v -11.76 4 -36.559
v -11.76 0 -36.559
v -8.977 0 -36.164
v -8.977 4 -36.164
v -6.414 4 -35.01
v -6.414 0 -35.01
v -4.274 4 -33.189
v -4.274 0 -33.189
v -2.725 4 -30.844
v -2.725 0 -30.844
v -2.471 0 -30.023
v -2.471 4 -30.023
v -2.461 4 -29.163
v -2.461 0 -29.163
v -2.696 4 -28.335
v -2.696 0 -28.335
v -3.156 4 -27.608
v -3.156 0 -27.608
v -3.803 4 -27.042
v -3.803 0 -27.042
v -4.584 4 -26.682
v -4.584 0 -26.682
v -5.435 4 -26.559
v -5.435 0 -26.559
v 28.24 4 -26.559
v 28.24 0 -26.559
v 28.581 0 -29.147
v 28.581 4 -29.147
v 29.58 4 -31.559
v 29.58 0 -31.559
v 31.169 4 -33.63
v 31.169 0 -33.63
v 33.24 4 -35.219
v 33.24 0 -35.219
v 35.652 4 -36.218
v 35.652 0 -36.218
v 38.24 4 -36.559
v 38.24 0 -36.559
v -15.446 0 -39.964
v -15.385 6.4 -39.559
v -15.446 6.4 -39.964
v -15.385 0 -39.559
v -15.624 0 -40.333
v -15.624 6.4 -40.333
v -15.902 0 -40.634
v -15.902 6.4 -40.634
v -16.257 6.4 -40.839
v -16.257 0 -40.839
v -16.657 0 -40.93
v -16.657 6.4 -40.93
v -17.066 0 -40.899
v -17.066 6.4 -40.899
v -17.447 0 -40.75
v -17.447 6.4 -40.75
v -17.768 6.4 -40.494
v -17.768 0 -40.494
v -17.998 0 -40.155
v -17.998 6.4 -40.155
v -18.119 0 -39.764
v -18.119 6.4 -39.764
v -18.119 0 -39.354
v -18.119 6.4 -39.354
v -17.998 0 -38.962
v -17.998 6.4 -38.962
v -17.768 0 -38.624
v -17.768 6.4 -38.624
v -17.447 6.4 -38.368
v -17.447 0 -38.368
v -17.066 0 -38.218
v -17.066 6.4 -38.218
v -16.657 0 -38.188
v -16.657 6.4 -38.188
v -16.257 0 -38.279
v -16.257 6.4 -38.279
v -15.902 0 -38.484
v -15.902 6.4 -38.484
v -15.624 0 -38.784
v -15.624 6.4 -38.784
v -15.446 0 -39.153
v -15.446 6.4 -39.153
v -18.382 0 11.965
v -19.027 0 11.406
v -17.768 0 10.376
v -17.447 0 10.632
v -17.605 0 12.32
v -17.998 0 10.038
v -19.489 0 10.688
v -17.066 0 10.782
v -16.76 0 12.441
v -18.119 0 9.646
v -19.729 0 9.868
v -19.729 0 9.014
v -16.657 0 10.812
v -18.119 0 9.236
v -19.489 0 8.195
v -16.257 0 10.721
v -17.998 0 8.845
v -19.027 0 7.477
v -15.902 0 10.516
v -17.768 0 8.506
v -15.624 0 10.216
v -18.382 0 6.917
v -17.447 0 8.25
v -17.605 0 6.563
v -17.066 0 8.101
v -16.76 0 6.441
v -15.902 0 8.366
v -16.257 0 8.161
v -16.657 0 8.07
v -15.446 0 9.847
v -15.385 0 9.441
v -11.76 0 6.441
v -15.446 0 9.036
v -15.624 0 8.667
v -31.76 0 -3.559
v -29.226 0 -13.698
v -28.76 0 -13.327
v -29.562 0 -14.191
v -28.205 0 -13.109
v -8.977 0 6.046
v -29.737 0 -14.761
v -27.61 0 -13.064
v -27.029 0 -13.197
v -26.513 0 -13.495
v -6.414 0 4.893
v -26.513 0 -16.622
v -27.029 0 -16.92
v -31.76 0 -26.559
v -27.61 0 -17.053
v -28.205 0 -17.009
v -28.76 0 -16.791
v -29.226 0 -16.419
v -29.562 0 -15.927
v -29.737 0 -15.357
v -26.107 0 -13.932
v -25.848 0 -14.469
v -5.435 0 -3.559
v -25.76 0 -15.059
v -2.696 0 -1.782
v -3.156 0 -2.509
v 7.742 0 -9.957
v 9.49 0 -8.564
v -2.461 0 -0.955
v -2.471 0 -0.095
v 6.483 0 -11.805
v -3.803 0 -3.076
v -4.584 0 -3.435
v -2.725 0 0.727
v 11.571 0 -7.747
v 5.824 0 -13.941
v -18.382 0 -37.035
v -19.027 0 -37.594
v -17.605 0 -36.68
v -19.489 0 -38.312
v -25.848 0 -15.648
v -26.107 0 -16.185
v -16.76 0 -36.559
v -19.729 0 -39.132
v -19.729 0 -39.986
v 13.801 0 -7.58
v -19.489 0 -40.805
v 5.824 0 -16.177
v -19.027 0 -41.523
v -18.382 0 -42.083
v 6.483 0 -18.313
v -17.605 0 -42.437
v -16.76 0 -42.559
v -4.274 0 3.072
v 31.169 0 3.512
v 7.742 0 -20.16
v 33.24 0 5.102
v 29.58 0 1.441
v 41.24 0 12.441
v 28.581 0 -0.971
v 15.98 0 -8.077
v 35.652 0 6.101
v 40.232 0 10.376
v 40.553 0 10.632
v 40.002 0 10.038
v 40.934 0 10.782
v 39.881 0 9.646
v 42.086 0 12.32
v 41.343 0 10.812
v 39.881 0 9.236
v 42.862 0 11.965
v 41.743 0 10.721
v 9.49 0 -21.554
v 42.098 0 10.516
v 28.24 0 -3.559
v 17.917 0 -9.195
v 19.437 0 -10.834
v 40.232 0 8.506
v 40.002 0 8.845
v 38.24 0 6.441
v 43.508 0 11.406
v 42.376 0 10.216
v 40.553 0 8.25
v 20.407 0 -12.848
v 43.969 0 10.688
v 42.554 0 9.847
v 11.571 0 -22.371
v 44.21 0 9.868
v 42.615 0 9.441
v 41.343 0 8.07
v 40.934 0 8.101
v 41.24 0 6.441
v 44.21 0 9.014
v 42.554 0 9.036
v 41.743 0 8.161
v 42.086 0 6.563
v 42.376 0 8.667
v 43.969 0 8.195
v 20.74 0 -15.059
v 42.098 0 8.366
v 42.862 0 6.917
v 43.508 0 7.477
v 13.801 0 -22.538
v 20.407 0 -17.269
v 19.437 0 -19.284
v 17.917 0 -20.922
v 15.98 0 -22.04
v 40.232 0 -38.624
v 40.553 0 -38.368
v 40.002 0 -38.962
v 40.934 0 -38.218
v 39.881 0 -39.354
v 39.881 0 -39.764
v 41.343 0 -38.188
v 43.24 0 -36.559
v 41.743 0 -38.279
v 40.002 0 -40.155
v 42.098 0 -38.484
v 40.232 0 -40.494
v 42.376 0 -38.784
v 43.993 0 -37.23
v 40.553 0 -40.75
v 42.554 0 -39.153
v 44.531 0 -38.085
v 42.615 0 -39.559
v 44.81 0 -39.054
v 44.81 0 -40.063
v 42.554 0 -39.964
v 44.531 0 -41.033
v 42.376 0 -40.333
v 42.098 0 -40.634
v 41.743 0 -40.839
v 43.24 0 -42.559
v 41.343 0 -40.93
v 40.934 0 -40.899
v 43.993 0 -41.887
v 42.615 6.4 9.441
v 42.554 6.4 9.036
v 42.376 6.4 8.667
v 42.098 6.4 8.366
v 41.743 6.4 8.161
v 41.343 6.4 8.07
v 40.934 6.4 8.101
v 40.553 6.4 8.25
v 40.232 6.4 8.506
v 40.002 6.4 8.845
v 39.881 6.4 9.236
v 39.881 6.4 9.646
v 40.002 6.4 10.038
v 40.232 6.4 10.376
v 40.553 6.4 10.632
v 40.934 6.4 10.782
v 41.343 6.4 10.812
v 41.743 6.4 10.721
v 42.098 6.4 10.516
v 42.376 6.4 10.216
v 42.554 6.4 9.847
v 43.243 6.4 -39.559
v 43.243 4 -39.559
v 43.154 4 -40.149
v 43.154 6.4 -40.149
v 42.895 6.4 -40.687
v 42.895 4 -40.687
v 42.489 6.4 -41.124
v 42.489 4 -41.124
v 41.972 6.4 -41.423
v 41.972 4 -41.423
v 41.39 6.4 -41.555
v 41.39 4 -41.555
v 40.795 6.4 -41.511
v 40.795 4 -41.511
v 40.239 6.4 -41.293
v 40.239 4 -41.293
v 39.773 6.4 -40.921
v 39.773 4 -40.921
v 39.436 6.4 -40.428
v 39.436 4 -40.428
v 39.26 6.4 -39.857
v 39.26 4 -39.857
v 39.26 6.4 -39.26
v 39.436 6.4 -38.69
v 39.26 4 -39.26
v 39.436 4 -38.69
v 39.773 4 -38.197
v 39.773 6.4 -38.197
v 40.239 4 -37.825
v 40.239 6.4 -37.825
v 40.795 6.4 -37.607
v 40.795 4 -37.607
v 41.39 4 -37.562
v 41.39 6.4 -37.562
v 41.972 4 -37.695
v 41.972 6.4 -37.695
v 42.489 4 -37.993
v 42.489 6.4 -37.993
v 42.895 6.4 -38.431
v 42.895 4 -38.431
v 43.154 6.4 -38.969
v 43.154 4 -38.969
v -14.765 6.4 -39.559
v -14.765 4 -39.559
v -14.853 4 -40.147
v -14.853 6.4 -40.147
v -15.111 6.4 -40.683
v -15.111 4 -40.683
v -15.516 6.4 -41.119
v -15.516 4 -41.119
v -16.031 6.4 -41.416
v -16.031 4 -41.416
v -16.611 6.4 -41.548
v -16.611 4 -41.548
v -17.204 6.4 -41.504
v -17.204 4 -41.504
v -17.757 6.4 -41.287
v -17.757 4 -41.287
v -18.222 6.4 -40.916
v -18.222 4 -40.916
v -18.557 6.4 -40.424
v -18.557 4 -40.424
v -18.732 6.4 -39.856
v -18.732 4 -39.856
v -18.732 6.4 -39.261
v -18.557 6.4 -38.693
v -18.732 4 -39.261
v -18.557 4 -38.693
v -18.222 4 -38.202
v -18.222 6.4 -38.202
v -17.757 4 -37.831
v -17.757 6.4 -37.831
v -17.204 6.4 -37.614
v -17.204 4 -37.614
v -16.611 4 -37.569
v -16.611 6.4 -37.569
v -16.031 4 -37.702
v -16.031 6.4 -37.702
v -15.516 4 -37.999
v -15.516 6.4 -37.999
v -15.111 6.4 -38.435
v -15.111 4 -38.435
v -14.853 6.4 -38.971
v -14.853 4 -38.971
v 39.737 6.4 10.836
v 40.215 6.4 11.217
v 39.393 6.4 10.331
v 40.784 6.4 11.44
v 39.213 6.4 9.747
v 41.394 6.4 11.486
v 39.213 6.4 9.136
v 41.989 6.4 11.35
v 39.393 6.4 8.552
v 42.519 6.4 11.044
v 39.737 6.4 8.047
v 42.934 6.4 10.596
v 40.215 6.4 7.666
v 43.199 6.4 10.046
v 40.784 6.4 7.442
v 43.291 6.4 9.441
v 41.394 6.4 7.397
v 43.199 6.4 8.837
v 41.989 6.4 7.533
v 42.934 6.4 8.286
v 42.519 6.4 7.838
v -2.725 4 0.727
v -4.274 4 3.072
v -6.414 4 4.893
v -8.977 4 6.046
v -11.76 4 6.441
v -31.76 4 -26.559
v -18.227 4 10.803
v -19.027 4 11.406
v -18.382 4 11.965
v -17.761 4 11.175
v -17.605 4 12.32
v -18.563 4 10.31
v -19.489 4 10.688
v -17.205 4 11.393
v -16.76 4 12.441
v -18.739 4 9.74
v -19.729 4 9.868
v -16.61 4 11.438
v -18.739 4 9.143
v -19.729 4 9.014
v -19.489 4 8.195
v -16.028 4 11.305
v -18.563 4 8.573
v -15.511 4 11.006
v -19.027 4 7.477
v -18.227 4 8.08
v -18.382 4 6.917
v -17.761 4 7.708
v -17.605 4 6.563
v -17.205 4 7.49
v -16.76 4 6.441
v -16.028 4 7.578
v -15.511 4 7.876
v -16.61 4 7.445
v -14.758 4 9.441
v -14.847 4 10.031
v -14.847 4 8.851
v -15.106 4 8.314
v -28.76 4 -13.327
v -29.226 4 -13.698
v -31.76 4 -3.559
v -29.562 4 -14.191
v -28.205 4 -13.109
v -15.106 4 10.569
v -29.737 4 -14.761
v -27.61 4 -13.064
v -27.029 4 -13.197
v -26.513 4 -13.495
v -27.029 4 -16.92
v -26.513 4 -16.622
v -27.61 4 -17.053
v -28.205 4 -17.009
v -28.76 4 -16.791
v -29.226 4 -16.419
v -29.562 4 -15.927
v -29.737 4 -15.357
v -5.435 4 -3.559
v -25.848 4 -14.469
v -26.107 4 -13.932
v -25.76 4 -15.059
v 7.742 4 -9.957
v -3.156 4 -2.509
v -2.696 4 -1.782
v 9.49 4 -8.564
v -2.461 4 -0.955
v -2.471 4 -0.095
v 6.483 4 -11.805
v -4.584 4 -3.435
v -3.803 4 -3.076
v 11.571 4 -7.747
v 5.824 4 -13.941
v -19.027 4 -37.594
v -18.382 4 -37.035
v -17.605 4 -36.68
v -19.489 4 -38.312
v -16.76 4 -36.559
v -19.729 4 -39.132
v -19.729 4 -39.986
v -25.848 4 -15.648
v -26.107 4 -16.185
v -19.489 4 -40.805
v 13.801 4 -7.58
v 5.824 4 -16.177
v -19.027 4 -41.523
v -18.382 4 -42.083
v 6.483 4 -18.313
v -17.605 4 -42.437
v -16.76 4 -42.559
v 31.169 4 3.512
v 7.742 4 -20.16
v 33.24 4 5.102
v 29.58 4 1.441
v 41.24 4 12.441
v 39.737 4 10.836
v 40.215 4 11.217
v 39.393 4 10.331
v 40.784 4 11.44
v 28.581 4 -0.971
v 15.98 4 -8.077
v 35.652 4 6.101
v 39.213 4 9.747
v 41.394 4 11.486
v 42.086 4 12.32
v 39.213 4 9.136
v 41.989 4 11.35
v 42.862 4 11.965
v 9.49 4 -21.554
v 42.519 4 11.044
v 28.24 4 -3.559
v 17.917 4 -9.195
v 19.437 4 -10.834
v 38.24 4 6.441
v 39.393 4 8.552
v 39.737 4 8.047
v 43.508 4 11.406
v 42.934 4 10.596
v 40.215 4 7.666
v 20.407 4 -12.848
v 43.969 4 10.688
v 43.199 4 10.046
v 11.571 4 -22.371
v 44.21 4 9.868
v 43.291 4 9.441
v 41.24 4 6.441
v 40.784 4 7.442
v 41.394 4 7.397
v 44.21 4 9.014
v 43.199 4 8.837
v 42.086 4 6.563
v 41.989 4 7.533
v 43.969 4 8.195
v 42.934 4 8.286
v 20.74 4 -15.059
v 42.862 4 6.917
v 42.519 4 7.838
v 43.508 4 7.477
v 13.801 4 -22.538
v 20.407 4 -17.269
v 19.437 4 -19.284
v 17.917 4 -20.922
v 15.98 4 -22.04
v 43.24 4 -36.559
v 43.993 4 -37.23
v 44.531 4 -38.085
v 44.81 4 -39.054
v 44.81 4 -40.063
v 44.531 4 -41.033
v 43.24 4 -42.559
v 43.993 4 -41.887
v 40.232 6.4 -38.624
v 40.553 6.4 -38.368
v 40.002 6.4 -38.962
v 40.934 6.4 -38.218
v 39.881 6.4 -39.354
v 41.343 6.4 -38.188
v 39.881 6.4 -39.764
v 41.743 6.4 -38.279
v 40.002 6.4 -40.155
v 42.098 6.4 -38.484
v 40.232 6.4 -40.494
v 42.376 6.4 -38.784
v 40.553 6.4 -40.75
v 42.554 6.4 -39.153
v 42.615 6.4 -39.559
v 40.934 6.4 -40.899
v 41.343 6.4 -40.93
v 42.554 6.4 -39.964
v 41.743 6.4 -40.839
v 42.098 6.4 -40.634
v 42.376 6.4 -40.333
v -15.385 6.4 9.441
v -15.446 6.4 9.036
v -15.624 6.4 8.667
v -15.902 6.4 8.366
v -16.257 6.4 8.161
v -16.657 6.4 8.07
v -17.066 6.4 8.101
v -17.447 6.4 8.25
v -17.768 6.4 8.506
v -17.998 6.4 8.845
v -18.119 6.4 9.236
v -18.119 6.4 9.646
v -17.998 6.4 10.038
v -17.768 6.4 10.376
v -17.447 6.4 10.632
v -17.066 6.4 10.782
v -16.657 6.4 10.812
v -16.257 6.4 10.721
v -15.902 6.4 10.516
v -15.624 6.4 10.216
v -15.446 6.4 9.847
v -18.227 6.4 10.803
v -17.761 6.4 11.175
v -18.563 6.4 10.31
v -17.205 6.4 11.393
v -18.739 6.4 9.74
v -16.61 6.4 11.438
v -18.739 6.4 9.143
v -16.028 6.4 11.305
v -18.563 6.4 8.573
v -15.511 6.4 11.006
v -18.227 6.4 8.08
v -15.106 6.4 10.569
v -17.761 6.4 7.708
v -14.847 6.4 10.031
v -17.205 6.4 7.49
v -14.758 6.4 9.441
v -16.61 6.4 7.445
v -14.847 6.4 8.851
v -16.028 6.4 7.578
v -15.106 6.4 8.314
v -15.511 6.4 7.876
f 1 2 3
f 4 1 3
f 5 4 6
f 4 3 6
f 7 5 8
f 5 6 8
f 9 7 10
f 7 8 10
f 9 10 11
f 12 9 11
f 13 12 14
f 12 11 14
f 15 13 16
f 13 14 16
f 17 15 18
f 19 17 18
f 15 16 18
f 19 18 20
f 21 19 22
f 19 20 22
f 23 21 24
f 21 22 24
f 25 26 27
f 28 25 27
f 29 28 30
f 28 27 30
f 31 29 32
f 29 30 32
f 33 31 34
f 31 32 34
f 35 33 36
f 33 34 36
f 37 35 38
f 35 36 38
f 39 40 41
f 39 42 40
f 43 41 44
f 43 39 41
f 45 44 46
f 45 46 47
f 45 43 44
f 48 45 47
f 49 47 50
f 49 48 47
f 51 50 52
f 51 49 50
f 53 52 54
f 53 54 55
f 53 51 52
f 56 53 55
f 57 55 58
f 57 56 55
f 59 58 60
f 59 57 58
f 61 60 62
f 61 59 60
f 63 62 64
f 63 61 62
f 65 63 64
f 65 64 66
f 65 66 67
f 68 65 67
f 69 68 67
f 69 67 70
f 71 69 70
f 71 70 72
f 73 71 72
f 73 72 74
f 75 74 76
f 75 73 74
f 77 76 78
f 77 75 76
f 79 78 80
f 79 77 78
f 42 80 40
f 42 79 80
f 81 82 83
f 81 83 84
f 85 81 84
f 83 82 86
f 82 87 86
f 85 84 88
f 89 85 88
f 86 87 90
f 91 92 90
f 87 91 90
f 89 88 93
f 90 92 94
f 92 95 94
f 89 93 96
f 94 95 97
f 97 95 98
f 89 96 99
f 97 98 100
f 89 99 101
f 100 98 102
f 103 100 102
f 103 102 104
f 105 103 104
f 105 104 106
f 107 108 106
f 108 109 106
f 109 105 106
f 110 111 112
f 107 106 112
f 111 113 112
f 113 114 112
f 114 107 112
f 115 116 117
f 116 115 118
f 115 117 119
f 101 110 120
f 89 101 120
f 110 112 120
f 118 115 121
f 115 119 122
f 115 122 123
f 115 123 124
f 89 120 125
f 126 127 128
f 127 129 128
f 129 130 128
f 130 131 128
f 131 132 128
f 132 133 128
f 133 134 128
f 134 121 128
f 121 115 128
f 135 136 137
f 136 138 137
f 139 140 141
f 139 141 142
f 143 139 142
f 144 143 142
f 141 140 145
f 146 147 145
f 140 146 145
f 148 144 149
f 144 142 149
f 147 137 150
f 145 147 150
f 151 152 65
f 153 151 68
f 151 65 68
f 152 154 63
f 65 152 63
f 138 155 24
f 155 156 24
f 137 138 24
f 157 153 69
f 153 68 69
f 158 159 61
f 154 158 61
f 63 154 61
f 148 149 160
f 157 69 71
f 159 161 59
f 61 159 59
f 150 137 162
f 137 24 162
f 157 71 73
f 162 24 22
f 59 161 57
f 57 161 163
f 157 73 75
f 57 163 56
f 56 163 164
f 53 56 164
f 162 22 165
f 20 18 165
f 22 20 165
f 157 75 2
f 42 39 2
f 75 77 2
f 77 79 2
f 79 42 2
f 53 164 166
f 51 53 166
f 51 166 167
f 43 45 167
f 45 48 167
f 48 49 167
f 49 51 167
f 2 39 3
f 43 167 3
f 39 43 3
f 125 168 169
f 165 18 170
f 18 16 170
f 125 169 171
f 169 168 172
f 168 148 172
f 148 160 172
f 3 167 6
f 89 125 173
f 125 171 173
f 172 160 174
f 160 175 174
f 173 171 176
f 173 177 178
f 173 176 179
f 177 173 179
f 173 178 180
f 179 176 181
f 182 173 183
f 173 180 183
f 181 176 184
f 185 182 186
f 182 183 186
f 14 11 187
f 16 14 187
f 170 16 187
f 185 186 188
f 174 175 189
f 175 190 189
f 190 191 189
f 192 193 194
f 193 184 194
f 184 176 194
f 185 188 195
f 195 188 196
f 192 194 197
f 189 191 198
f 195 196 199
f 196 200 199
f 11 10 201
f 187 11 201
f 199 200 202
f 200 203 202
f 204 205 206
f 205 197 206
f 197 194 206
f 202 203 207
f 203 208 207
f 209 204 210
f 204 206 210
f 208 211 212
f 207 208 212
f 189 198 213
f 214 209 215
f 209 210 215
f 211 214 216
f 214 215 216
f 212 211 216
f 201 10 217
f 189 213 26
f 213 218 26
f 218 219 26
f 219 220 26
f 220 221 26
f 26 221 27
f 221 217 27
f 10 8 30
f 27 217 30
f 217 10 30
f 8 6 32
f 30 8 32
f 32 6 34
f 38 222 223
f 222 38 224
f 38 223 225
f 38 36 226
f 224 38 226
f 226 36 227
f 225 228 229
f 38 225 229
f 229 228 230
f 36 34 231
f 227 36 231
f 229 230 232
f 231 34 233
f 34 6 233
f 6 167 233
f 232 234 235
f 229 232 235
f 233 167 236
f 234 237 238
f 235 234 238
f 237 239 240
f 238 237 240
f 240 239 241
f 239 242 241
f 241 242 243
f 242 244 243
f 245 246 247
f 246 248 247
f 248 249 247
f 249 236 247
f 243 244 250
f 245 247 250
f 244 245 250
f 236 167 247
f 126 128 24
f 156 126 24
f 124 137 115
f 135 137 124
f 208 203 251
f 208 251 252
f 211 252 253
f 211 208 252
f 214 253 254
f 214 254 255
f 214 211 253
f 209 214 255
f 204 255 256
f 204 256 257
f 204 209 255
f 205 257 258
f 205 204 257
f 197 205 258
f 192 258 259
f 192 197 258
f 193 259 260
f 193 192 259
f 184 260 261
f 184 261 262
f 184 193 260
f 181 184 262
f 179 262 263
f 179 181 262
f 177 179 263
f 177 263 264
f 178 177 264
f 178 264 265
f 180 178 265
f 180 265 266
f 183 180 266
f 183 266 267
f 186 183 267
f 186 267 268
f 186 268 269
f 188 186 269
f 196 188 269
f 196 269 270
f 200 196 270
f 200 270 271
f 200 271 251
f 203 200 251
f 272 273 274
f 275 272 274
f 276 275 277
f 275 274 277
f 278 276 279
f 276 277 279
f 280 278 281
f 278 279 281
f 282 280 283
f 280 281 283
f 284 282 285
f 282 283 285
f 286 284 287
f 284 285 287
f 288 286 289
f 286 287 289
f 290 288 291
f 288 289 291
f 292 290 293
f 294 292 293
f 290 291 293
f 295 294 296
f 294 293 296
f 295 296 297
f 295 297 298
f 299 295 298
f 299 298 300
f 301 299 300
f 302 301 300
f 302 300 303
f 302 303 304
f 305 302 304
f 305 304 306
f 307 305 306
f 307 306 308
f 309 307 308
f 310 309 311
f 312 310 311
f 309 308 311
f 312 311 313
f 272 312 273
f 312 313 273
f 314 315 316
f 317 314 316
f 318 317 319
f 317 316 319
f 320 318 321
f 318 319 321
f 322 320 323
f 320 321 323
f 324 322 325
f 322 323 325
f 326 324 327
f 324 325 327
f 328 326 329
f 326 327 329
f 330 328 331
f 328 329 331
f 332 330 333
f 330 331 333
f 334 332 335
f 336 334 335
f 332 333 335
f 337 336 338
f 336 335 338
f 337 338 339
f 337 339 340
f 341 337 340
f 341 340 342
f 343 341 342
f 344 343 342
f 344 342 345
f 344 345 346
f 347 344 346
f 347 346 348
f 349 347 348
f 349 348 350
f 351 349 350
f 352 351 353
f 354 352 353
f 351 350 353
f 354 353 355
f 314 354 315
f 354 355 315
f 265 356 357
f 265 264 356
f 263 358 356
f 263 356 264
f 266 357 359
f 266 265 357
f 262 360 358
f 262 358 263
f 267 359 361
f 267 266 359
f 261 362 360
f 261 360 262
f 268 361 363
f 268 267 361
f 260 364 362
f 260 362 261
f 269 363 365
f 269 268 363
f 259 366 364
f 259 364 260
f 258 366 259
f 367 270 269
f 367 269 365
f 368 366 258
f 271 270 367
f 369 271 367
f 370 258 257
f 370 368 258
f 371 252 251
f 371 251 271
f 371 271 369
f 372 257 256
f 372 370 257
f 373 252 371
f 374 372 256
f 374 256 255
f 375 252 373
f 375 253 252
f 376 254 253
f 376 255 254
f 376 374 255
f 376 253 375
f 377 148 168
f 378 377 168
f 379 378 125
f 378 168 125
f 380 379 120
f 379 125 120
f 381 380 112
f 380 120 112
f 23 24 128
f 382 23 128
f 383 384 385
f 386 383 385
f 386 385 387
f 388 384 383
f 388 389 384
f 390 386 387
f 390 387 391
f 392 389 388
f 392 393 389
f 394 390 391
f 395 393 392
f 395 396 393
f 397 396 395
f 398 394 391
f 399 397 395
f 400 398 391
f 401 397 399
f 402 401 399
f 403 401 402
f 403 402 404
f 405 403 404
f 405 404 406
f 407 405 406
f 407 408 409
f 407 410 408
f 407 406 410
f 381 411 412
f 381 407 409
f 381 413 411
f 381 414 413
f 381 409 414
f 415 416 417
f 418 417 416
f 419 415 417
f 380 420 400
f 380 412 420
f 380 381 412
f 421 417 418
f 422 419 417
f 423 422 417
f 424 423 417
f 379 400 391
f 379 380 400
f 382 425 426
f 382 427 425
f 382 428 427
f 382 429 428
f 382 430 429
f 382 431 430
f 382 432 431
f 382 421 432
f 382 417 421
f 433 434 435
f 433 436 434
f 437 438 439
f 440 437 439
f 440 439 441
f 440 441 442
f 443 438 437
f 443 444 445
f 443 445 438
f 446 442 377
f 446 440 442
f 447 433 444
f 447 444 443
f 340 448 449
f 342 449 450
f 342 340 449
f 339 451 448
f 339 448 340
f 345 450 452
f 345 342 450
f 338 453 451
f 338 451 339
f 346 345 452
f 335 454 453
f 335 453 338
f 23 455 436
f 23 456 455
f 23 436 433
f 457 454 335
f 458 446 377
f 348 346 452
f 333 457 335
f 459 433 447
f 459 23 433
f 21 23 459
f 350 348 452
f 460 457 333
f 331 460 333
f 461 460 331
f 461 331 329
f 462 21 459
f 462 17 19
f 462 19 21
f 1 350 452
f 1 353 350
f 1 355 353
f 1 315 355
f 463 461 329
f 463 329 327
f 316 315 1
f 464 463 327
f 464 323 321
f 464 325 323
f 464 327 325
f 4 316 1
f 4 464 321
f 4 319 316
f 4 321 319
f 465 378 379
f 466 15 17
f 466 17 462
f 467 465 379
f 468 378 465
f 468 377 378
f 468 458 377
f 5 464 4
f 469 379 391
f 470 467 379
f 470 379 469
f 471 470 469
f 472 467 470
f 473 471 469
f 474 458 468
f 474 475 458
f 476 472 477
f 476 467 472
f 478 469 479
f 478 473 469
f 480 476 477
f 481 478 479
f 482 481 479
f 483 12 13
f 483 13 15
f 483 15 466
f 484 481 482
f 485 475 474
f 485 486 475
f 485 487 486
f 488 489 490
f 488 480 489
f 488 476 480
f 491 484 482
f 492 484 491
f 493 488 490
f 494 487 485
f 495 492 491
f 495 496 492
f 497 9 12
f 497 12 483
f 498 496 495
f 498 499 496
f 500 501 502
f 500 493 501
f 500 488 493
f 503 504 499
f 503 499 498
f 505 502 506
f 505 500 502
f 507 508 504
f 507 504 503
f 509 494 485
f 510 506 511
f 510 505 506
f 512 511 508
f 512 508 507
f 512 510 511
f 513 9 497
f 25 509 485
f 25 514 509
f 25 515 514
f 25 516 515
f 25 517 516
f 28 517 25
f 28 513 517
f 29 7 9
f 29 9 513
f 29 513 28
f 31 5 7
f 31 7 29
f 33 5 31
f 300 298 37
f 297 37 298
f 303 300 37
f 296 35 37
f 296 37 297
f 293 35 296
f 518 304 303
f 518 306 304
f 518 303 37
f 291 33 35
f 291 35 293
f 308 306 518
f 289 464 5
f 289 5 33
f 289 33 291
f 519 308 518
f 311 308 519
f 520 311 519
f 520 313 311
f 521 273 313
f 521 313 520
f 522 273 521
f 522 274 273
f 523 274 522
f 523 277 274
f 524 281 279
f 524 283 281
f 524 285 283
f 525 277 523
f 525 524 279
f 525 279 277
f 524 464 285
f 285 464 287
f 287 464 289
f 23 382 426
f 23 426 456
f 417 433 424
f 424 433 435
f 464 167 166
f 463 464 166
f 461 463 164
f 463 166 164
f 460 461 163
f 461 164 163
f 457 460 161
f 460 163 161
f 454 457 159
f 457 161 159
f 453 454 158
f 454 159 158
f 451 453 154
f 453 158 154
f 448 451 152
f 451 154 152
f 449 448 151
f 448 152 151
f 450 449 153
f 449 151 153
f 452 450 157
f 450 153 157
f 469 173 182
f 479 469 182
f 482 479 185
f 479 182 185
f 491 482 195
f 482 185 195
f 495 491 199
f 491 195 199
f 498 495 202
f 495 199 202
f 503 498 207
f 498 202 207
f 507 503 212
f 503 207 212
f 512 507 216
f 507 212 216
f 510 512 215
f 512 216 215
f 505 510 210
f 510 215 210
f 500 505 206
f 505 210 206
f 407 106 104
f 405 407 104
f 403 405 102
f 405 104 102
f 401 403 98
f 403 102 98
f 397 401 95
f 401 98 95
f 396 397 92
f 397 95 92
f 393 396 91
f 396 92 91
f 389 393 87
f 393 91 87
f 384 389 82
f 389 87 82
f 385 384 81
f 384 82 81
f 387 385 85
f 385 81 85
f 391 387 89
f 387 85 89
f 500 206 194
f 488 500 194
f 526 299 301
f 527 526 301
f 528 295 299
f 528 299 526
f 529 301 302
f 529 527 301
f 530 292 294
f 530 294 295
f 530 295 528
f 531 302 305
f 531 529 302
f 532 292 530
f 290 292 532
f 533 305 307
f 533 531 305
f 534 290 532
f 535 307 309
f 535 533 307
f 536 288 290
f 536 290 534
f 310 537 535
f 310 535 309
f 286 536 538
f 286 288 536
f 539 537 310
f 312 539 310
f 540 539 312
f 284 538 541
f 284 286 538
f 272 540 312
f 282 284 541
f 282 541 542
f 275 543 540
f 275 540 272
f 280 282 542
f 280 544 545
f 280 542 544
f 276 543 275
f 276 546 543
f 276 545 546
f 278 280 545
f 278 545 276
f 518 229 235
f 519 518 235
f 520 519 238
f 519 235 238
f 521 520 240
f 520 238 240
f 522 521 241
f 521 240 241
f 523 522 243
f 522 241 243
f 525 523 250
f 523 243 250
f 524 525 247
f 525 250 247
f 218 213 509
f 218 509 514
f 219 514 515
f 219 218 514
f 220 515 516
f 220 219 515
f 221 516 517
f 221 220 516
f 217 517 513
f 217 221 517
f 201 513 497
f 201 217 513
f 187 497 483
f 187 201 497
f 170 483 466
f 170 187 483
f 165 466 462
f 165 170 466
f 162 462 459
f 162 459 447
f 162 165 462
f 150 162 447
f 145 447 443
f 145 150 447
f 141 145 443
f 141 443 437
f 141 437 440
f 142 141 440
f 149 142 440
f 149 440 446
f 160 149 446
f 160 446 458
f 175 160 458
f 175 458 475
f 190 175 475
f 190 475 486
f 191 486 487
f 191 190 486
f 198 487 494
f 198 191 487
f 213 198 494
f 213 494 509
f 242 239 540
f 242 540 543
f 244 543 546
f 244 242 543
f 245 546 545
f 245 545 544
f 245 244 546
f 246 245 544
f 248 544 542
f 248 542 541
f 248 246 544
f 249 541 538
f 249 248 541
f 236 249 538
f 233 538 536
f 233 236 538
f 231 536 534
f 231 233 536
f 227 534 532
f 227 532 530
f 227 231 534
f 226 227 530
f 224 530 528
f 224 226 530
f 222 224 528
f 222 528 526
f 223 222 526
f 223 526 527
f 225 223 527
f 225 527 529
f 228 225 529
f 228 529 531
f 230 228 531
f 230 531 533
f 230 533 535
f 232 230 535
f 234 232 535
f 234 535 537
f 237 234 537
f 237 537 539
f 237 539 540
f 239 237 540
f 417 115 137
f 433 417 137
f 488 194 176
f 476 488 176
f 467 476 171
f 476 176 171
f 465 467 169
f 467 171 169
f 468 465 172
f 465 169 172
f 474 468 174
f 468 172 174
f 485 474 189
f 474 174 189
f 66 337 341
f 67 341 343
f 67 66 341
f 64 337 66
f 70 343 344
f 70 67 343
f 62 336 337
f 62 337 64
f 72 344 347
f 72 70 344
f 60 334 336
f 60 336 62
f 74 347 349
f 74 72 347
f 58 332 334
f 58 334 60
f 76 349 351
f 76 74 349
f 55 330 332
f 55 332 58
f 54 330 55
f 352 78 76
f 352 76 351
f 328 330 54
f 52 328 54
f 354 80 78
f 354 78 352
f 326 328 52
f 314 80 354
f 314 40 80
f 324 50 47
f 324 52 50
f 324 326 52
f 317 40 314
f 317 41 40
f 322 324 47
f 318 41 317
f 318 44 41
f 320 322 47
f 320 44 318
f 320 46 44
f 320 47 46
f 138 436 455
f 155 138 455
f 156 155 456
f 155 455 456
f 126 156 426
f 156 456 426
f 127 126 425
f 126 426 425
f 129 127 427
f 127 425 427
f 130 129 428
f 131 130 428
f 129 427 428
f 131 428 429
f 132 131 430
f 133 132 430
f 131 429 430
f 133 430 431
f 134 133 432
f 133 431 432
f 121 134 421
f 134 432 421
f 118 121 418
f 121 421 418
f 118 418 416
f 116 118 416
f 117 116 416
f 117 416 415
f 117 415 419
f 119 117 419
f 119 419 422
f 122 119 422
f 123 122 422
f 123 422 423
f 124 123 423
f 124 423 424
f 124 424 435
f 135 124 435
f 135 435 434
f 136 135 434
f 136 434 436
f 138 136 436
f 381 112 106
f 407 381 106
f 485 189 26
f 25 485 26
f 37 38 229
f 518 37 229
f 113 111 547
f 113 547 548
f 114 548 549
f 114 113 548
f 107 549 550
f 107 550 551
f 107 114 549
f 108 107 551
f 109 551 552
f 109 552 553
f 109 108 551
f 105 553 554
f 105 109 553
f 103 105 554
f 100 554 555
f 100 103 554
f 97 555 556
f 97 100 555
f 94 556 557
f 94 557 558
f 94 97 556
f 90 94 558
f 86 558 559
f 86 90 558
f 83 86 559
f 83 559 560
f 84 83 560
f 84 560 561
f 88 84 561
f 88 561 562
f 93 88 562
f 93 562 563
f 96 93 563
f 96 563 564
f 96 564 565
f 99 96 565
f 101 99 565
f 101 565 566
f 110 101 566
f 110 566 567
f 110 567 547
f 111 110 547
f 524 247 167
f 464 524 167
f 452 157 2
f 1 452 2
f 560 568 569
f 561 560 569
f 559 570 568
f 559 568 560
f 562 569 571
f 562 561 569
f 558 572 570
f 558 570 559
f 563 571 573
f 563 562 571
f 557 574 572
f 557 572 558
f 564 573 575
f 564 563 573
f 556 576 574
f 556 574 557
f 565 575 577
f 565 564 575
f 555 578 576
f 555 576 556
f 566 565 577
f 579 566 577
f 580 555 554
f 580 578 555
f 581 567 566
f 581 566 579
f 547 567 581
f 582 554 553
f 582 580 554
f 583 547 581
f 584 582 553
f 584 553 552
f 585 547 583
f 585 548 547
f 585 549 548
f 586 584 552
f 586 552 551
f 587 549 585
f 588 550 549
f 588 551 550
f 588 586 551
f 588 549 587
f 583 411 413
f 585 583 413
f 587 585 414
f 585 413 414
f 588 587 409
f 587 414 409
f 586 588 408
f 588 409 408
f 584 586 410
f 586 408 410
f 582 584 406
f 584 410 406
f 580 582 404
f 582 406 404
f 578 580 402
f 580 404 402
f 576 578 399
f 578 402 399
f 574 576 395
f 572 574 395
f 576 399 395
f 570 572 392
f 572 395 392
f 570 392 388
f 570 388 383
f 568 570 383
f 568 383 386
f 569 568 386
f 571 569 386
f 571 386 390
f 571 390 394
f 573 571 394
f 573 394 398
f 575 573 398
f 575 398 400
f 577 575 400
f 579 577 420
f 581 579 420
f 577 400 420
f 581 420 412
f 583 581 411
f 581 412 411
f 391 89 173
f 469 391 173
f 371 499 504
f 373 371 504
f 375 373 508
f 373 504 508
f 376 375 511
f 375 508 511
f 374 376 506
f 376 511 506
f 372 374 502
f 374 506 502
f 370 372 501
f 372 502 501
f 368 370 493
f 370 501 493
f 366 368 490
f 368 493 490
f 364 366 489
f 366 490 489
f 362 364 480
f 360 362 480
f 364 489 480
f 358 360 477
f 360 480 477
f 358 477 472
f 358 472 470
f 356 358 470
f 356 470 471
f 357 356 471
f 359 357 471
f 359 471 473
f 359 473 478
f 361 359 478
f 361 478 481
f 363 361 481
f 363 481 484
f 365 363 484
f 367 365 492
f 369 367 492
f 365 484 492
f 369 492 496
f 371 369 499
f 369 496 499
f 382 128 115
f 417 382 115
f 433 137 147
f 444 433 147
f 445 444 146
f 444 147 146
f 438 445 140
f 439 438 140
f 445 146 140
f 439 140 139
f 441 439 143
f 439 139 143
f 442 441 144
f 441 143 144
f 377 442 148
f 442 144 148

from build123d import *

# Parameters (mm, degrees)
SKETCH2_R           = 1.375
SKETCH2_R_2         = 7.5
BOSS_EXTRUDE1_DEPTH = 4
SKETCH3_R           = 2
CUT_EXTRUDE1_DEPTH  = 10
SKETCH7_R           = 1.995105634
SKETCH7_R_2         = 1.375
SKETCH7_R_3         = 2.001880143
SKETCH7_R_4         = 2.050219115
SKETCH7_R_5         = 2.002328612
BOSS_EXTRUDE2_DEPTH = 2.4


with BuildPart() as part:
    # Sketch2 → Boss-Extrude1 (new body)
    with BuildSketch(Plane(origin=(0, 0, 0), x_dir=(1, 0, 0), z_dir=(0, 1, 0))):
        with BuildLine():
            Line((43.240356283, 42.558742845), (-16.759643717, 42.558742845))
            ThreePointArc((-16.759643717, 42.558742845), (-19.759643717, 39.558742845), (-16.759643717, 36.558742845))
            Line((-16.759643717, 36.558742845), (-11.759643717, 36.558742845))
            ThreePointArc((-11.759643717, 36.558742845), (-6.414418879, 35.010285392), (-2.724564688, 30.84445713))
            ThreePointArc((-2.724564688, 30.84445713), (-2.899625633, 27.955175393), (-5.435088397, 26.558742845))
            Line((-5.435088397, 26.558742845), (-28.759643717, 26.558742845))
            Line((-28.759643717, 26.558742845), (-31.759643717, 26.558742845))
            Line((-31.759643717, 26.558742845), (-31.759643717, 23.558742845))
            Line((-31.759643717, 23.558742845), (-31.759643717, 6.558742845))
            Line((-31.759643717, 6.558742845), (-31.759643717, 3.558742845))
            Line((-31.759643717, 3.558742845), (-28.759643717, 3.558742845))
            Line((-28.759643717, 3.558742845), (-5.435088397, 3.558742845))
            ThreePointArc((-5.435088397, 3.558742845), (-2.899625633, 2.162310296), (-2.724564688, -0.726971441))
            ThreePointArc((-2.724564688, -0.726971441), (-6.414418879, -4.892799703), (-11.759643717, -6.441257155))
            Line((-11.759643717, -6.441257155), (-16.759643717, -6.441257155))
            ThreePointArc((-16.759643717, -6.441257155), (-19.759643717, -9.441257155), (-16.759643717, -12.441257155))
            Line((-16.759643717, -12.441257155), (41.240356283, -12.441257155))
            ThreePointArc((41.240356283, -12.441257155), (44.240356283, -9.441257155), (41.240356283, -6.441257155))
            Line((41.240356283, -6.441257155), (38.240356283, -6.441257155))
            ThreePointArc((38.240356283, -6.441257155), (31.169288471, -3.512324967), (28.240356283, 3.558742845))
            Line((28.240356283, 3.558742845), (28.240356283, 26.558742845))
            ThreePointArc((28.240356283, 26.558742845), (31.169288471, 33.629810657), (38.240356283, 36.558742845))
            Line((38.240356283, 36.558742845), (43.240356283, 36.558742845))
            ThreePointArc((43.240356283, 36.558742845), (44.845907558, 39.558742845), (43.240356283, 42.558742845))
        make_face()
        with Locations((-16.759643717, -9.441257155)):
            Circle(SKETCH2_R, mode=Mode.SUBTRACT)
        with Locations((41.240356283, -9.441257155)):
            Circle(SKETCH2_R, mode=Mode.SUBTRACT)
        with Locations((13.240356283, 15.058742845)):
            Circle(SKETCH2_R_2, mode=Mode.SUBTRACT)
        with Locations((-16.759643717, 39.558742845)):
            Circle(SKETCH2_R, mode=Mode.SUBTRACT)
        with Locations((41.240356283, 39.558742845)):
            Circle(SKETCH2_R, mode=Mode.SUBTRACT)
    extrude(amount=BOSS_EXTRUDE1_DEPTH)

    # Sketch3 → Cut-Extrude1 (cut)
    with BuildSketch(Plane(origin=(0, 4, 0), x_dir=(1, 0, 0), z_dir=(0, 1, 0))):
        with Locations((-27.759643717, 15.058742845)):
            Circle(SKETCH3_R)
    extrude(amount=-CUT_EXTRUDE1_DEPTH, mode=Mode.SUBTRACT)

    # Sketch7 → Boss-Extrude2 (add)
    with BuildSketch(Plane(origin=(0, 4, 0), x_dir=(1, 0, 0), z_dir=(0, 1, 0))):
        with Locations((-16.759643717, 39.558742845)):
            Circle(SKETCH7_R)
        with Locations((-16.759643717, 39.558742845)):
            Circle(SKETCH7_R_2, mode=Mode.SUBTRACT)
        with Locations((-16.759643717, -9.441257155)):
            Circle(SKETCH7_R_3)
        with Locations((-16.759643717, -9.441257155)):
            Circle(SKETCH7_R_2, mode=Mode.SUBTRACT)
        with Locations((41.240356283, -9.441257155)):
            Circle(SKETCH7_R_4)
        with Locations((41.240356283, -9.441257155)):
            Circle(SKETCH7_R_2, mode=Mode.SUBTRACT)
        with Locations((41.240356283, 39.558742845)):
            Circle(SKETCH7_R_5)
        with Locations((41.240356283, 39.558742845)):
            Circle(SKETCH7_R_2, mode=Mode.SUBTRACT)
    extrude(amount=BOSS_EXTRUDE2_DEPTH)


solid = part.part
